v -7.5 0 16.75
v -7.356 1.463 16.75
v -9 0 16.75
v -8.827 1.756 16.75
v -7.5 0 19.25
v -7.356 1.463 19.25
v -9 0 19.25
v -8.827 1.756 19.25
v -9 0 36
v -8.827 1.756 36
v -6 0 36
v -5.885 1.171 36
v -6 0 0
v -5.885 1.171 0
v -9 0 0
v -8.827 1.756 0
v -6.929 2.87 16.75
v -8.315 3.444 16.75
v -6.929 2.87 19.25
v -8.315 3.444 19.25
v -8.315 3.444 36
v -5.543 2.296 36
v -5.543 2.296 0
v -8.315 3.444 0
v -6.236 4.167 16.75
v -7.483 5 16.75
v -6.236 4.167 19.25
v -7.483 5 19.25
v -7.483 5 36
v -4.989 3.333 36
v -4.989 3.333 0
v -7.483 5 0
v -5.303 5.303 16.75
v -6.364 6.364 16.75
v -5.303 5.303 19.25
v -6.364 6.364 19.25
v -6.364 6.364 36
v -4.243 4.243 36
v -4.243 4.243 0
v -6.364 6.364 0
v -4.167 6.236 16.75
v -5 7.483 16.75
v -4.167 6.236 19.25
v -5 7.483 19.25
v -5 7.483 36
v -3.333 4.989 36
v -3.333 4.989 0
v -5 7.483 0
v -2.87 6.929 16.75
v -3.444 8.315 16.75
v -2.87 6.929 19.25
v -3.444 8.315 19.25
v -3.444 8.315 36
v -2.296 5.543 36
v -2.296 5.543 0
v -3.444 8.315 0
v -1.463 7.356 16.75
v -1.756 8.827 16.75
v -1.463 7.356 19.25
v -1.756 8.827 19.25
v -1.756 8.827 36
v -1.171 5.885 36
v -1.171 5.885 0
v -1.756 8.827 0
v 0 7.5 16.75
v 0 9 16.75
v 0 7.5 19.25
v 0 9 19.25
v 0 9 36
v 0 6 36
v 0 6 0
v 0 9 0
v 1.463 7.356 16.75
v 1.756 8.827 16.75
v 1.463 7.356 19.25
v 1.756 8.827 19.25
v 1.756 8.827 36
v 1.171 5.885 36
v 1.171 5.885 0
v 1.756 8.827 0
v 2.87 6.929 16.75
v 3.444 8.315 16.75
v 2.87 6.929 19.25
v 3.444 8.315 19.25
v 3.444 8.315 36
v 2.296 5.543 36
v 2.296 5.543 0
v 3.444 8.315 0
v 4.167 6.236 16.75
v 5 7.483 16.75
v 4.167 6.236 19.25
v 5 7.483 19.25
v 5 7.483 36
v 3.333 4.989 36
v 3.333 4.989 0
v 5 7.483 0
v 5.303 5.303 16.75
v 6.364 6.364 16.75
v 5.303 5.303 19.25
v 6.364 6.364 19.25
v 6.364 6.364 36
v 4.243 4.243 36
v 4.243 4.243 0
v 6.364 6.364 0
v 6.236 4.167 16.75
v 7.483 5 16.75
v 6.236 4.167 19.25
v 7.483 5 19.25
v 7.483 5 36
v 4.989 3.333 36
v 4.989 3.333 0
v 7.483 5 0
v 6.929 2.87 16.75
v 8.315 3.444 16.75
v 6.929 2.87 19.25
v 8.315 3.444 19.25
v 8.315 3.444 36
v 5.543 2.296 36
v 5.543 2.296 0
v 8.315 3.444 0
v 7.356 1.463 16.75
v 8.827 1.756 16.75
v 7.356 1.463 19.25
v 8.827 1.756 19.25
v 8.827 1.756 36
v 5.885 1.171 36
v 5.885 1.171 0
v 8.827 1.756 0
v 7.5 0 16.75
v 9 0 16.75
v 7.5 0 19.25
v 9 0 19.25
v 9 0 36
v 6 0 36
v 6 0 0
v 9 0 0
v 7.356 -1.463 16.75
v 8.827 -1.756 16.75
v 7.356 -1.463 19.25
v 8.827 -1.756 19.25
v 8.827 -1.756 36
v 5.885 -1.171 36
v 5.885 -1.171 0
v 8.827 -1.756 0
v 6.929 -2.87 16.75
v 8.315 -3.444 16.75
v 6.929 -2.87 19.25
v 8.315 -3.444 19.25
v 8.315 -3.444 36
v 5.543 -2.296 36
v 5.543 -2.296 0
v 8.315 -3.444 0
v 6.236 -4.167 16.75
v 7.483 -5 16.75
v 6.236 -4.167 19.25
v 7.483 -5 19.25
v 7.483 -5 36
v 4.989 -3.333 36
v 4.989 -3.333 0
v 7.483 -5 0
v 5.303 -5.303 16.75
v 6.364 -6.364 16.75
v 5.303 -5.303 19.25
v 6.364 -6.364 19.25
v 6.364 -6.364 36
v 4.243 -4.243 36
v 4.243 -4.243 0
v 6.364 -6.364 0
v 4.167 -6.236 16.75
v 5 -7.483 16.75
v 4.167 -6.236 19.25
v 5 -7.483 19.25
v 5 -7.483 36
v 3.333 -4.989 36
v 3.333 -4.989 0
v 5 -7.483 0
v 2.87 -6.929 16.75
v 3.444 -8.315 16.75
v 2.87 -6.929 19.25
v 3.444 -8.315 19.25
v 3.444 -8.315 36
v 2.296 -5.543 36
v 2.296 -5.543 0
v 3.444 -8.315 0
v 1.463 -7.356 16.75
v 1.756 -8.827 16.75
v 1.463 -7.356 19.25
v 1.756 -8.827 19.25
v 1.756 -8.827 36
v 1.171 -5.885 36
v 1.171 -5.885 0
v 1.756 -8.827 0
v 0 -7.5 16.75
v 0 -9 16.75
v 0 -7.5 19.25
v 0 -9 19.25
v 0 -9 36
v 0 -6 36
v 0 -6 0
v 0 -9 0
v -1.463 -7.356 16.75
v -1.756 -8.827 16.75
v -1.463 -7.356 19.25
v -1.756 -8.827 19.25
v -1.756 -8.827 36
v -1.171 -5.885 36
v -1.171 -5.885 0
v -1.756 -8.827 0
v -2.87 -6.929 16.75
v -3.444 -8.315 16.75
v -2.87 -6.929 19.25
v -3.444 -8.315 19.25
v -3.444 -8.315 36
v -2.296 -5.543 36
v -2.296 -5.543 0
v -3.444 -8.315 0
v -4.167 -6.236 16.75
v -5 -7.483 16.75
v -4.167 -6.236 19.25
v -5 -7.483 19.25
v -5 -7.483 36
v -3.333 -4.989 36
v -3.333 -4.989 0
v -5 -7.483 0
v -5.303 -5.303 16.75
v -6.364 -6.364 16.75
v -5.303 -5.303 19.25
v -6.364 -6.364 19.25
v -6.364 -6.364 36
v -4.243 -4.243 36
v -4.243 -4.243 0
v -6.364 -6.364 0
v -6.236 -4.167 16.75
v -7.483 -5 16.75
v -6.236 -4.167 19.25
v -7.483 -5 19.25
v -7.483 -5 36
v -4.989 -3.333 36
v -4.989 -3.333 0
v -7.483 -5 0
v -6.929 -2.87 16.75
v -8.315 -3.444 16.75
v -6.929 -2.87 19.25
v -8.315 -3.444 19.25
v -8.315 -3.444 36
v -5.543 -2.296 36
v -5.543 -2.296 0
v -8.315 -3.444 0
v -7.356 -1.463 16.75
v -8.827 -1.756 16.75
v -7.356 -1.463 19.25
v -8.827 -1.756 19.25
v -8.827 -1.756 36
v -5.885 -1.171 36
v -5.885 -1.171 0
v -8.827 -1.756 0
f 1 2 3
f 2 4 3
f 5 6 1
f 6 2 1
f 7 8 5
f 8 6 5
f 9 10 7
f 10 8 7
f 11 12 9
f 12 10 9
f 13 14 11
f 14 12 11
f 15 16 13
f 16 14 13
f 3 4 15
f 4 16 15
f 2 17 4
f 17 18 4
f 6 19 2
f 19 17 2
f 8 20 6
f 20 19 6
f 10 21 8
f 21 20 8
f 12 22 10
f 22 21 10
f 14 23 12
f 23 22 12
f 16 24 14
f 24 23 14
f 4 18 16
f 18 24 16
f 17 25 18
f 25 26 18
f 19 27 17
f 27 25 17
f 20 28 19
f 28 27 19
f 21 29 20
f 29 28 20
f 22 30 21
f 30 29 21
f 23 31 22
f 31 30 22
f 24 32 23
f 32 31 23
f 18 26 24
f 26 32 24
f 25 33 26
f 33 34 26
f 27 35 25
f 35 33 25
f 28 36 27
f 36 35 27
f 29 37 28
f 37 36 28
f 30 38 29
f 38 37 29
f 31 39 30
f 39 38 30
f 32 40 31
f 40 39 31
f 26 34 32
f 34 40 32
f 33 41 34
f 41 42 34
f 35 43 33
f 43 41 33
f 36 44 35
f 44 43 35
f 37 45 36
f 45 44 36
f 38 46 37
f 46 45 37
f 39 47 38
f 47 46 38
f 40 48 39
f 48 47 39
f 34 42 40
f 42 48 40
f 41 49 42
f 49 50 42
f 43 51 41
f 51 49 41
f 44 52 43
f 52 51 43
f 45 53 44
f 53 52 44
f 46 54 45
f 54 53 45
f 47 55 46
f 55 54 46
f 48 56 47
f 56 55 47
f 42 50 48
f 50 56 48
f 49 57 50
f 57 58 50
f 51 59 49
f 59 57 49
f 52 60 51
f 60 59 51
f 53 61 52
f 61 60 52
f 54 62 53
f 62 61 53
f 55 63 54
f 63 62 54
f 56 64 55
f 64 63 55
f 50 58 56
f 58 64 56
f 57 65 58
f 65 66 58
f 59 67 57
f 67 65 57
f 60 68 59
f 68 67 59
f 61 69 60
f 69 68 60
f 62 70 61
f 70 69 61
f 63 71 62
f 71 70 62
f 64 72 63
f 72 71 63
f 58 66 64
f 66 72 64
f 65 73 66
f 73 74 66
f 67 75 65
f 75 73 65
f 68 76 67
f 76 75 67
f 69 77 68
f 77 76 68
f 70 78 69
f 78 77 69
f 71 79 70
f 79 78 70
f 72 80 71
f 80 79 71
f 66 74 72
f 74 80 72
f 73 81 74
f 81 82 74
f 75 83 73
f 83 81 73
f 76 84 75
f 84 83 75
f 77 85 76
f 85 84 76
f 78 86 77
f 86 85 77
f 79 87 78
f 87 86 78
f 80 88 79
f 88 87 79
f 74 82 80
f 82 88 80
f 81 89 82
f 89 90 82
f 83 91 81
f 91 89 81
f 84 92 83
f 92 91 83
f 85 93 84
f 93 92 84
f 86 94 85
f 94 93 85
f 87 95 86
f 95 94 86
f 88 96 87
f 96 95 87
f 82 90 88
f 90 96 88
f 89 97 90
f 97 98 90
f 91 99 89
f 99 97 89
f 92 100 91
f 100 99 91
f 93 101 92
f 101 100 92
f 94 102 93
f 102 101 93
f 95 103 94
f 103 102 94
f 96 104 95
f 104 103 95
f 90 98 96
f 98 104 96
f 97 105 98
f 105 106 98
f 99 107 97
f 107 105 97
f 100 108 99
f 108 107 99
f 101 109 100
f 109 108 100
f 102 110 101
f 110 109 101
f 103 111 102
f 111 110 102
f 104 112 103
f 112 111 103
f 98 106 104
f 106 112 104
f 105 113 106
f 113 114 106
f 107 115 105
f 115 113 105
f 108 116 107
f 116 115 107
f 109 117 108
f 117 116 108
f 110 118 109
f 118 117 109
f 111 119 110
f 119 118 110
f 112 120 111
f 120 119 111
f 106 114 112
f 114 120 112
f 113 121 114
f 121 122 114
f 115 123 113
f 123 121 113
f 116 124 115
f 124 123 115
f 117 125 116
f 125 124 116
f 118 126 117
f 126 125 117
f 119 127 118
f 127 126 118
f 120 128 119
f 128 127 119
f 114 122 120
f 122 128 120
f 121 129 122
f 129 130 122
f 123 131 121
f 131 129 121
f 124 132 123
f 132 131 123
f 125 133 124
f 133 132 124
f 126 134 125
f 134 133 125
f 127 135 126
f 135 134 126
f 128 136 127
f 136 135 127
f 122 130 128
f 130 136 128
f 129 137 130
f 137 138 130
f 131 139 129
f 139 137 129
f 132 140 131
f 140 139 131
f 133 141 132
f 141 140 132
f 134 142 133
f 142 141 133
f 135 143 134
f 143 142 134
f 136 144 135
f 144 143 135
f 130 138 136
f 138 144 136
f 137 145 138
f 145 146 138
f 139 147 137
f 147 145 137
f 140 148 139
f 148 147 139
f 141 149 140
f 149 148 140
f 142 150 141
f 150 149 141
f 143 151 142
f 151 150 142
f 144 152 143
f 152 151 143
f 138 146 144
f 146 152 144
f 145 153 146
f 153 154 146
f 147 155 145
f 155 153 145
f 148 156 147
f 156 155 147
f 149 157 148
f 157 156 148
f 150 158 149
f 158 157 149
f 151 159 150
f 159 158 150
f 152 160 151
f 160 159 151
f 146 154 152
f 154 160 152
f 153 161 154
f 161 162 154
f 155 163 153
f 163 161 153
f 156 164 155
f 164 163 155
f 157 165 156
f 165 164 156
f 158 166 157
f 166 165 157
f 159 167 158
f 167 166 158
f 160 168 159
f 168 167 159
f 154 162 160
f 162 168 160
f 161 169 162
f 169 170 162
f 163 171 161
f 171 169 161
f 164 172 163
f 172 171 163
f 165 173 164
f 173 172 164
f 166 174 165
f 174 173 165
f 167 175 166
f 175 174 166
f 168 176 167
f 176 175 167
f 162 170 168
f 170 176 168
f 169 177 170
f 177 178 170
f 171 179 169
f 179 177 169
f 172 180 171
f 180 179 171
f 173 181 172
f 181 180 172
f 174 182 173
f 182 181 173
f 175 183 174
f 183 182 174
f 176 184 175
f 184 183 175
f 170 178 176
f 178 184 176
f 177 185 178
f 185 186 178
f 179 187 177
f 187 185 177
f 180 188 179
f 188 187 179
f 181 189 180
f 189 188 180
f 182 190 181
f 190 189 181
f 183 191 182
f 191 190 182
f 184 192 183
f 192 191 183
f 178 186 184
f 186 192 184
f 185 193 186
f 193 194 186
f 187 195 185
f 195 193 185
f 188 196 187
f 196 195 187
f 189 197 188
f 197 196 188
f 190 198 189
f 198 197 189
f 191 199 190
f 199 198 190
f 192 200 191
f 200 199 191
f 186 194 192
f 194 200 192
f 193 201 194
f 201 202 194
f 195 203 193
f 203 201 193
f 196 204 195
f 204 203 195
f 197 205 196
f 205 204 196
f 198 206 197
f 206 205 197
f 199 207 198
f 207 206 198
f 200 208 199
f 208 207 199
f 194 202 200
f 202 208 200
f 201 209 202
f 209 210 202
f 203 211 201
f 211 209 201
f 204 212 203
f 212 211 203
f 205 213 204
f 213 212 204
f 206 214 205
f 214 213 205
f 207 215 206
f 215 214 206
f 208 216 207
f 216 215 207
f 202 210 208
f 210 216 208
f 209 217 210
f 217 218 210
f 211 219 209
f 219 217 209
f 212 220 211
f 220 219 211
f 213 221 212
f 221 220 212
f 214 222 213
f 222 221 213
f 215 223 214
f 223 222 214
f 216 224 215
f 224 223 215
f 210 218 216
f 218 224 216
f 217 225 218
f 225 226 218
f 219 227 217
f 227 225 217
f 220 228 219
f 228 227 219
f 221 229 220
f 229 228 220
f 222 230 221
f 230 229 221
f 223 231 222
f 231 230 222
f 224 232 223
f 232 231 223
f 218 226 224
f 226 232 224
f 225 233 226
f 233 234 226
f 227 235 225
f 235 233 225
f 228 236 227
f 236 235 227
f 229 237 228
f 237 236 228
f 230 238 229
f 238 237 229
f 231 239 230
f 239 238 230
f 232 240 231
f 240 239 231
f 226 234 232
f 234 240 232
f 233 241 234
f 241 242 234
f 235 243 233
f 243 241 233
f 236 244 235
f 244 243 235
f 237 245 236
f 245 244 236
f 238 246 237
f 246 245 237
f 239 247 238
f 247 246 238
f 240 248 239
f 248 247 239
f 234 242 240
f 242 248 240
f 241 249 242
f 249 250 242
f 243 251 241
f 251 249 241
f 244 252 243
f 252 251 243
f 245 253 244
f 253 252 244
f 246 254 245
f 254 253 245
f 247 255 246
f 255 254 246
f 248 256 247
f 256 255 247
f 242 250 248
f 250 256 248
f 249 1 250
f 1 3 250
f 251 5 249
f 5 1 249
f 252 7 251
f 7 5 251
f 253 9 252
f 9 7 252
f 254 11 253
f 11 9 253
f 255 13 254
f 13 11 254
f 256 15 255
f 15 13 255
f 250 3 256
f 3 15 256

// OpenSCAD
$fn = 32;

// ----------------------------------------------------------------------
// Grooved revolve: plain_grooves, bore R6
// ----------------------------------------------------------------------

// --- parameters (mm) ---
bore_r = 6;               // bore radius
outer_r = 9;              // outer radius of the body
total_h = 36;             // overall height, Z
wall = 3;                 // radial wall thickness
groove_w = 2.5;           // groove width
groove_d = 1.5;           // groove depth
grooves = 1;              // number of outer grooves

bbox_x = 2 * outer_r;  // full diameter
bore_d = 2 * bore_r;  // bore diameter
body_d = 2 * outer_r;  // body diameter
revolve_angle = 360;  // full turn around the Z axis

profile = [[6, 0], [9, 0], [9, 16.75], [7.5, 16.75], [7.5, 19.25], [9, 19.25], [9, 36], [6, 36]];  // primary outline, 8 points, counter clockwise

// --- the one profile operation ---
rotate_extrude(angle = revolve_angle) polygon(points = profile);
